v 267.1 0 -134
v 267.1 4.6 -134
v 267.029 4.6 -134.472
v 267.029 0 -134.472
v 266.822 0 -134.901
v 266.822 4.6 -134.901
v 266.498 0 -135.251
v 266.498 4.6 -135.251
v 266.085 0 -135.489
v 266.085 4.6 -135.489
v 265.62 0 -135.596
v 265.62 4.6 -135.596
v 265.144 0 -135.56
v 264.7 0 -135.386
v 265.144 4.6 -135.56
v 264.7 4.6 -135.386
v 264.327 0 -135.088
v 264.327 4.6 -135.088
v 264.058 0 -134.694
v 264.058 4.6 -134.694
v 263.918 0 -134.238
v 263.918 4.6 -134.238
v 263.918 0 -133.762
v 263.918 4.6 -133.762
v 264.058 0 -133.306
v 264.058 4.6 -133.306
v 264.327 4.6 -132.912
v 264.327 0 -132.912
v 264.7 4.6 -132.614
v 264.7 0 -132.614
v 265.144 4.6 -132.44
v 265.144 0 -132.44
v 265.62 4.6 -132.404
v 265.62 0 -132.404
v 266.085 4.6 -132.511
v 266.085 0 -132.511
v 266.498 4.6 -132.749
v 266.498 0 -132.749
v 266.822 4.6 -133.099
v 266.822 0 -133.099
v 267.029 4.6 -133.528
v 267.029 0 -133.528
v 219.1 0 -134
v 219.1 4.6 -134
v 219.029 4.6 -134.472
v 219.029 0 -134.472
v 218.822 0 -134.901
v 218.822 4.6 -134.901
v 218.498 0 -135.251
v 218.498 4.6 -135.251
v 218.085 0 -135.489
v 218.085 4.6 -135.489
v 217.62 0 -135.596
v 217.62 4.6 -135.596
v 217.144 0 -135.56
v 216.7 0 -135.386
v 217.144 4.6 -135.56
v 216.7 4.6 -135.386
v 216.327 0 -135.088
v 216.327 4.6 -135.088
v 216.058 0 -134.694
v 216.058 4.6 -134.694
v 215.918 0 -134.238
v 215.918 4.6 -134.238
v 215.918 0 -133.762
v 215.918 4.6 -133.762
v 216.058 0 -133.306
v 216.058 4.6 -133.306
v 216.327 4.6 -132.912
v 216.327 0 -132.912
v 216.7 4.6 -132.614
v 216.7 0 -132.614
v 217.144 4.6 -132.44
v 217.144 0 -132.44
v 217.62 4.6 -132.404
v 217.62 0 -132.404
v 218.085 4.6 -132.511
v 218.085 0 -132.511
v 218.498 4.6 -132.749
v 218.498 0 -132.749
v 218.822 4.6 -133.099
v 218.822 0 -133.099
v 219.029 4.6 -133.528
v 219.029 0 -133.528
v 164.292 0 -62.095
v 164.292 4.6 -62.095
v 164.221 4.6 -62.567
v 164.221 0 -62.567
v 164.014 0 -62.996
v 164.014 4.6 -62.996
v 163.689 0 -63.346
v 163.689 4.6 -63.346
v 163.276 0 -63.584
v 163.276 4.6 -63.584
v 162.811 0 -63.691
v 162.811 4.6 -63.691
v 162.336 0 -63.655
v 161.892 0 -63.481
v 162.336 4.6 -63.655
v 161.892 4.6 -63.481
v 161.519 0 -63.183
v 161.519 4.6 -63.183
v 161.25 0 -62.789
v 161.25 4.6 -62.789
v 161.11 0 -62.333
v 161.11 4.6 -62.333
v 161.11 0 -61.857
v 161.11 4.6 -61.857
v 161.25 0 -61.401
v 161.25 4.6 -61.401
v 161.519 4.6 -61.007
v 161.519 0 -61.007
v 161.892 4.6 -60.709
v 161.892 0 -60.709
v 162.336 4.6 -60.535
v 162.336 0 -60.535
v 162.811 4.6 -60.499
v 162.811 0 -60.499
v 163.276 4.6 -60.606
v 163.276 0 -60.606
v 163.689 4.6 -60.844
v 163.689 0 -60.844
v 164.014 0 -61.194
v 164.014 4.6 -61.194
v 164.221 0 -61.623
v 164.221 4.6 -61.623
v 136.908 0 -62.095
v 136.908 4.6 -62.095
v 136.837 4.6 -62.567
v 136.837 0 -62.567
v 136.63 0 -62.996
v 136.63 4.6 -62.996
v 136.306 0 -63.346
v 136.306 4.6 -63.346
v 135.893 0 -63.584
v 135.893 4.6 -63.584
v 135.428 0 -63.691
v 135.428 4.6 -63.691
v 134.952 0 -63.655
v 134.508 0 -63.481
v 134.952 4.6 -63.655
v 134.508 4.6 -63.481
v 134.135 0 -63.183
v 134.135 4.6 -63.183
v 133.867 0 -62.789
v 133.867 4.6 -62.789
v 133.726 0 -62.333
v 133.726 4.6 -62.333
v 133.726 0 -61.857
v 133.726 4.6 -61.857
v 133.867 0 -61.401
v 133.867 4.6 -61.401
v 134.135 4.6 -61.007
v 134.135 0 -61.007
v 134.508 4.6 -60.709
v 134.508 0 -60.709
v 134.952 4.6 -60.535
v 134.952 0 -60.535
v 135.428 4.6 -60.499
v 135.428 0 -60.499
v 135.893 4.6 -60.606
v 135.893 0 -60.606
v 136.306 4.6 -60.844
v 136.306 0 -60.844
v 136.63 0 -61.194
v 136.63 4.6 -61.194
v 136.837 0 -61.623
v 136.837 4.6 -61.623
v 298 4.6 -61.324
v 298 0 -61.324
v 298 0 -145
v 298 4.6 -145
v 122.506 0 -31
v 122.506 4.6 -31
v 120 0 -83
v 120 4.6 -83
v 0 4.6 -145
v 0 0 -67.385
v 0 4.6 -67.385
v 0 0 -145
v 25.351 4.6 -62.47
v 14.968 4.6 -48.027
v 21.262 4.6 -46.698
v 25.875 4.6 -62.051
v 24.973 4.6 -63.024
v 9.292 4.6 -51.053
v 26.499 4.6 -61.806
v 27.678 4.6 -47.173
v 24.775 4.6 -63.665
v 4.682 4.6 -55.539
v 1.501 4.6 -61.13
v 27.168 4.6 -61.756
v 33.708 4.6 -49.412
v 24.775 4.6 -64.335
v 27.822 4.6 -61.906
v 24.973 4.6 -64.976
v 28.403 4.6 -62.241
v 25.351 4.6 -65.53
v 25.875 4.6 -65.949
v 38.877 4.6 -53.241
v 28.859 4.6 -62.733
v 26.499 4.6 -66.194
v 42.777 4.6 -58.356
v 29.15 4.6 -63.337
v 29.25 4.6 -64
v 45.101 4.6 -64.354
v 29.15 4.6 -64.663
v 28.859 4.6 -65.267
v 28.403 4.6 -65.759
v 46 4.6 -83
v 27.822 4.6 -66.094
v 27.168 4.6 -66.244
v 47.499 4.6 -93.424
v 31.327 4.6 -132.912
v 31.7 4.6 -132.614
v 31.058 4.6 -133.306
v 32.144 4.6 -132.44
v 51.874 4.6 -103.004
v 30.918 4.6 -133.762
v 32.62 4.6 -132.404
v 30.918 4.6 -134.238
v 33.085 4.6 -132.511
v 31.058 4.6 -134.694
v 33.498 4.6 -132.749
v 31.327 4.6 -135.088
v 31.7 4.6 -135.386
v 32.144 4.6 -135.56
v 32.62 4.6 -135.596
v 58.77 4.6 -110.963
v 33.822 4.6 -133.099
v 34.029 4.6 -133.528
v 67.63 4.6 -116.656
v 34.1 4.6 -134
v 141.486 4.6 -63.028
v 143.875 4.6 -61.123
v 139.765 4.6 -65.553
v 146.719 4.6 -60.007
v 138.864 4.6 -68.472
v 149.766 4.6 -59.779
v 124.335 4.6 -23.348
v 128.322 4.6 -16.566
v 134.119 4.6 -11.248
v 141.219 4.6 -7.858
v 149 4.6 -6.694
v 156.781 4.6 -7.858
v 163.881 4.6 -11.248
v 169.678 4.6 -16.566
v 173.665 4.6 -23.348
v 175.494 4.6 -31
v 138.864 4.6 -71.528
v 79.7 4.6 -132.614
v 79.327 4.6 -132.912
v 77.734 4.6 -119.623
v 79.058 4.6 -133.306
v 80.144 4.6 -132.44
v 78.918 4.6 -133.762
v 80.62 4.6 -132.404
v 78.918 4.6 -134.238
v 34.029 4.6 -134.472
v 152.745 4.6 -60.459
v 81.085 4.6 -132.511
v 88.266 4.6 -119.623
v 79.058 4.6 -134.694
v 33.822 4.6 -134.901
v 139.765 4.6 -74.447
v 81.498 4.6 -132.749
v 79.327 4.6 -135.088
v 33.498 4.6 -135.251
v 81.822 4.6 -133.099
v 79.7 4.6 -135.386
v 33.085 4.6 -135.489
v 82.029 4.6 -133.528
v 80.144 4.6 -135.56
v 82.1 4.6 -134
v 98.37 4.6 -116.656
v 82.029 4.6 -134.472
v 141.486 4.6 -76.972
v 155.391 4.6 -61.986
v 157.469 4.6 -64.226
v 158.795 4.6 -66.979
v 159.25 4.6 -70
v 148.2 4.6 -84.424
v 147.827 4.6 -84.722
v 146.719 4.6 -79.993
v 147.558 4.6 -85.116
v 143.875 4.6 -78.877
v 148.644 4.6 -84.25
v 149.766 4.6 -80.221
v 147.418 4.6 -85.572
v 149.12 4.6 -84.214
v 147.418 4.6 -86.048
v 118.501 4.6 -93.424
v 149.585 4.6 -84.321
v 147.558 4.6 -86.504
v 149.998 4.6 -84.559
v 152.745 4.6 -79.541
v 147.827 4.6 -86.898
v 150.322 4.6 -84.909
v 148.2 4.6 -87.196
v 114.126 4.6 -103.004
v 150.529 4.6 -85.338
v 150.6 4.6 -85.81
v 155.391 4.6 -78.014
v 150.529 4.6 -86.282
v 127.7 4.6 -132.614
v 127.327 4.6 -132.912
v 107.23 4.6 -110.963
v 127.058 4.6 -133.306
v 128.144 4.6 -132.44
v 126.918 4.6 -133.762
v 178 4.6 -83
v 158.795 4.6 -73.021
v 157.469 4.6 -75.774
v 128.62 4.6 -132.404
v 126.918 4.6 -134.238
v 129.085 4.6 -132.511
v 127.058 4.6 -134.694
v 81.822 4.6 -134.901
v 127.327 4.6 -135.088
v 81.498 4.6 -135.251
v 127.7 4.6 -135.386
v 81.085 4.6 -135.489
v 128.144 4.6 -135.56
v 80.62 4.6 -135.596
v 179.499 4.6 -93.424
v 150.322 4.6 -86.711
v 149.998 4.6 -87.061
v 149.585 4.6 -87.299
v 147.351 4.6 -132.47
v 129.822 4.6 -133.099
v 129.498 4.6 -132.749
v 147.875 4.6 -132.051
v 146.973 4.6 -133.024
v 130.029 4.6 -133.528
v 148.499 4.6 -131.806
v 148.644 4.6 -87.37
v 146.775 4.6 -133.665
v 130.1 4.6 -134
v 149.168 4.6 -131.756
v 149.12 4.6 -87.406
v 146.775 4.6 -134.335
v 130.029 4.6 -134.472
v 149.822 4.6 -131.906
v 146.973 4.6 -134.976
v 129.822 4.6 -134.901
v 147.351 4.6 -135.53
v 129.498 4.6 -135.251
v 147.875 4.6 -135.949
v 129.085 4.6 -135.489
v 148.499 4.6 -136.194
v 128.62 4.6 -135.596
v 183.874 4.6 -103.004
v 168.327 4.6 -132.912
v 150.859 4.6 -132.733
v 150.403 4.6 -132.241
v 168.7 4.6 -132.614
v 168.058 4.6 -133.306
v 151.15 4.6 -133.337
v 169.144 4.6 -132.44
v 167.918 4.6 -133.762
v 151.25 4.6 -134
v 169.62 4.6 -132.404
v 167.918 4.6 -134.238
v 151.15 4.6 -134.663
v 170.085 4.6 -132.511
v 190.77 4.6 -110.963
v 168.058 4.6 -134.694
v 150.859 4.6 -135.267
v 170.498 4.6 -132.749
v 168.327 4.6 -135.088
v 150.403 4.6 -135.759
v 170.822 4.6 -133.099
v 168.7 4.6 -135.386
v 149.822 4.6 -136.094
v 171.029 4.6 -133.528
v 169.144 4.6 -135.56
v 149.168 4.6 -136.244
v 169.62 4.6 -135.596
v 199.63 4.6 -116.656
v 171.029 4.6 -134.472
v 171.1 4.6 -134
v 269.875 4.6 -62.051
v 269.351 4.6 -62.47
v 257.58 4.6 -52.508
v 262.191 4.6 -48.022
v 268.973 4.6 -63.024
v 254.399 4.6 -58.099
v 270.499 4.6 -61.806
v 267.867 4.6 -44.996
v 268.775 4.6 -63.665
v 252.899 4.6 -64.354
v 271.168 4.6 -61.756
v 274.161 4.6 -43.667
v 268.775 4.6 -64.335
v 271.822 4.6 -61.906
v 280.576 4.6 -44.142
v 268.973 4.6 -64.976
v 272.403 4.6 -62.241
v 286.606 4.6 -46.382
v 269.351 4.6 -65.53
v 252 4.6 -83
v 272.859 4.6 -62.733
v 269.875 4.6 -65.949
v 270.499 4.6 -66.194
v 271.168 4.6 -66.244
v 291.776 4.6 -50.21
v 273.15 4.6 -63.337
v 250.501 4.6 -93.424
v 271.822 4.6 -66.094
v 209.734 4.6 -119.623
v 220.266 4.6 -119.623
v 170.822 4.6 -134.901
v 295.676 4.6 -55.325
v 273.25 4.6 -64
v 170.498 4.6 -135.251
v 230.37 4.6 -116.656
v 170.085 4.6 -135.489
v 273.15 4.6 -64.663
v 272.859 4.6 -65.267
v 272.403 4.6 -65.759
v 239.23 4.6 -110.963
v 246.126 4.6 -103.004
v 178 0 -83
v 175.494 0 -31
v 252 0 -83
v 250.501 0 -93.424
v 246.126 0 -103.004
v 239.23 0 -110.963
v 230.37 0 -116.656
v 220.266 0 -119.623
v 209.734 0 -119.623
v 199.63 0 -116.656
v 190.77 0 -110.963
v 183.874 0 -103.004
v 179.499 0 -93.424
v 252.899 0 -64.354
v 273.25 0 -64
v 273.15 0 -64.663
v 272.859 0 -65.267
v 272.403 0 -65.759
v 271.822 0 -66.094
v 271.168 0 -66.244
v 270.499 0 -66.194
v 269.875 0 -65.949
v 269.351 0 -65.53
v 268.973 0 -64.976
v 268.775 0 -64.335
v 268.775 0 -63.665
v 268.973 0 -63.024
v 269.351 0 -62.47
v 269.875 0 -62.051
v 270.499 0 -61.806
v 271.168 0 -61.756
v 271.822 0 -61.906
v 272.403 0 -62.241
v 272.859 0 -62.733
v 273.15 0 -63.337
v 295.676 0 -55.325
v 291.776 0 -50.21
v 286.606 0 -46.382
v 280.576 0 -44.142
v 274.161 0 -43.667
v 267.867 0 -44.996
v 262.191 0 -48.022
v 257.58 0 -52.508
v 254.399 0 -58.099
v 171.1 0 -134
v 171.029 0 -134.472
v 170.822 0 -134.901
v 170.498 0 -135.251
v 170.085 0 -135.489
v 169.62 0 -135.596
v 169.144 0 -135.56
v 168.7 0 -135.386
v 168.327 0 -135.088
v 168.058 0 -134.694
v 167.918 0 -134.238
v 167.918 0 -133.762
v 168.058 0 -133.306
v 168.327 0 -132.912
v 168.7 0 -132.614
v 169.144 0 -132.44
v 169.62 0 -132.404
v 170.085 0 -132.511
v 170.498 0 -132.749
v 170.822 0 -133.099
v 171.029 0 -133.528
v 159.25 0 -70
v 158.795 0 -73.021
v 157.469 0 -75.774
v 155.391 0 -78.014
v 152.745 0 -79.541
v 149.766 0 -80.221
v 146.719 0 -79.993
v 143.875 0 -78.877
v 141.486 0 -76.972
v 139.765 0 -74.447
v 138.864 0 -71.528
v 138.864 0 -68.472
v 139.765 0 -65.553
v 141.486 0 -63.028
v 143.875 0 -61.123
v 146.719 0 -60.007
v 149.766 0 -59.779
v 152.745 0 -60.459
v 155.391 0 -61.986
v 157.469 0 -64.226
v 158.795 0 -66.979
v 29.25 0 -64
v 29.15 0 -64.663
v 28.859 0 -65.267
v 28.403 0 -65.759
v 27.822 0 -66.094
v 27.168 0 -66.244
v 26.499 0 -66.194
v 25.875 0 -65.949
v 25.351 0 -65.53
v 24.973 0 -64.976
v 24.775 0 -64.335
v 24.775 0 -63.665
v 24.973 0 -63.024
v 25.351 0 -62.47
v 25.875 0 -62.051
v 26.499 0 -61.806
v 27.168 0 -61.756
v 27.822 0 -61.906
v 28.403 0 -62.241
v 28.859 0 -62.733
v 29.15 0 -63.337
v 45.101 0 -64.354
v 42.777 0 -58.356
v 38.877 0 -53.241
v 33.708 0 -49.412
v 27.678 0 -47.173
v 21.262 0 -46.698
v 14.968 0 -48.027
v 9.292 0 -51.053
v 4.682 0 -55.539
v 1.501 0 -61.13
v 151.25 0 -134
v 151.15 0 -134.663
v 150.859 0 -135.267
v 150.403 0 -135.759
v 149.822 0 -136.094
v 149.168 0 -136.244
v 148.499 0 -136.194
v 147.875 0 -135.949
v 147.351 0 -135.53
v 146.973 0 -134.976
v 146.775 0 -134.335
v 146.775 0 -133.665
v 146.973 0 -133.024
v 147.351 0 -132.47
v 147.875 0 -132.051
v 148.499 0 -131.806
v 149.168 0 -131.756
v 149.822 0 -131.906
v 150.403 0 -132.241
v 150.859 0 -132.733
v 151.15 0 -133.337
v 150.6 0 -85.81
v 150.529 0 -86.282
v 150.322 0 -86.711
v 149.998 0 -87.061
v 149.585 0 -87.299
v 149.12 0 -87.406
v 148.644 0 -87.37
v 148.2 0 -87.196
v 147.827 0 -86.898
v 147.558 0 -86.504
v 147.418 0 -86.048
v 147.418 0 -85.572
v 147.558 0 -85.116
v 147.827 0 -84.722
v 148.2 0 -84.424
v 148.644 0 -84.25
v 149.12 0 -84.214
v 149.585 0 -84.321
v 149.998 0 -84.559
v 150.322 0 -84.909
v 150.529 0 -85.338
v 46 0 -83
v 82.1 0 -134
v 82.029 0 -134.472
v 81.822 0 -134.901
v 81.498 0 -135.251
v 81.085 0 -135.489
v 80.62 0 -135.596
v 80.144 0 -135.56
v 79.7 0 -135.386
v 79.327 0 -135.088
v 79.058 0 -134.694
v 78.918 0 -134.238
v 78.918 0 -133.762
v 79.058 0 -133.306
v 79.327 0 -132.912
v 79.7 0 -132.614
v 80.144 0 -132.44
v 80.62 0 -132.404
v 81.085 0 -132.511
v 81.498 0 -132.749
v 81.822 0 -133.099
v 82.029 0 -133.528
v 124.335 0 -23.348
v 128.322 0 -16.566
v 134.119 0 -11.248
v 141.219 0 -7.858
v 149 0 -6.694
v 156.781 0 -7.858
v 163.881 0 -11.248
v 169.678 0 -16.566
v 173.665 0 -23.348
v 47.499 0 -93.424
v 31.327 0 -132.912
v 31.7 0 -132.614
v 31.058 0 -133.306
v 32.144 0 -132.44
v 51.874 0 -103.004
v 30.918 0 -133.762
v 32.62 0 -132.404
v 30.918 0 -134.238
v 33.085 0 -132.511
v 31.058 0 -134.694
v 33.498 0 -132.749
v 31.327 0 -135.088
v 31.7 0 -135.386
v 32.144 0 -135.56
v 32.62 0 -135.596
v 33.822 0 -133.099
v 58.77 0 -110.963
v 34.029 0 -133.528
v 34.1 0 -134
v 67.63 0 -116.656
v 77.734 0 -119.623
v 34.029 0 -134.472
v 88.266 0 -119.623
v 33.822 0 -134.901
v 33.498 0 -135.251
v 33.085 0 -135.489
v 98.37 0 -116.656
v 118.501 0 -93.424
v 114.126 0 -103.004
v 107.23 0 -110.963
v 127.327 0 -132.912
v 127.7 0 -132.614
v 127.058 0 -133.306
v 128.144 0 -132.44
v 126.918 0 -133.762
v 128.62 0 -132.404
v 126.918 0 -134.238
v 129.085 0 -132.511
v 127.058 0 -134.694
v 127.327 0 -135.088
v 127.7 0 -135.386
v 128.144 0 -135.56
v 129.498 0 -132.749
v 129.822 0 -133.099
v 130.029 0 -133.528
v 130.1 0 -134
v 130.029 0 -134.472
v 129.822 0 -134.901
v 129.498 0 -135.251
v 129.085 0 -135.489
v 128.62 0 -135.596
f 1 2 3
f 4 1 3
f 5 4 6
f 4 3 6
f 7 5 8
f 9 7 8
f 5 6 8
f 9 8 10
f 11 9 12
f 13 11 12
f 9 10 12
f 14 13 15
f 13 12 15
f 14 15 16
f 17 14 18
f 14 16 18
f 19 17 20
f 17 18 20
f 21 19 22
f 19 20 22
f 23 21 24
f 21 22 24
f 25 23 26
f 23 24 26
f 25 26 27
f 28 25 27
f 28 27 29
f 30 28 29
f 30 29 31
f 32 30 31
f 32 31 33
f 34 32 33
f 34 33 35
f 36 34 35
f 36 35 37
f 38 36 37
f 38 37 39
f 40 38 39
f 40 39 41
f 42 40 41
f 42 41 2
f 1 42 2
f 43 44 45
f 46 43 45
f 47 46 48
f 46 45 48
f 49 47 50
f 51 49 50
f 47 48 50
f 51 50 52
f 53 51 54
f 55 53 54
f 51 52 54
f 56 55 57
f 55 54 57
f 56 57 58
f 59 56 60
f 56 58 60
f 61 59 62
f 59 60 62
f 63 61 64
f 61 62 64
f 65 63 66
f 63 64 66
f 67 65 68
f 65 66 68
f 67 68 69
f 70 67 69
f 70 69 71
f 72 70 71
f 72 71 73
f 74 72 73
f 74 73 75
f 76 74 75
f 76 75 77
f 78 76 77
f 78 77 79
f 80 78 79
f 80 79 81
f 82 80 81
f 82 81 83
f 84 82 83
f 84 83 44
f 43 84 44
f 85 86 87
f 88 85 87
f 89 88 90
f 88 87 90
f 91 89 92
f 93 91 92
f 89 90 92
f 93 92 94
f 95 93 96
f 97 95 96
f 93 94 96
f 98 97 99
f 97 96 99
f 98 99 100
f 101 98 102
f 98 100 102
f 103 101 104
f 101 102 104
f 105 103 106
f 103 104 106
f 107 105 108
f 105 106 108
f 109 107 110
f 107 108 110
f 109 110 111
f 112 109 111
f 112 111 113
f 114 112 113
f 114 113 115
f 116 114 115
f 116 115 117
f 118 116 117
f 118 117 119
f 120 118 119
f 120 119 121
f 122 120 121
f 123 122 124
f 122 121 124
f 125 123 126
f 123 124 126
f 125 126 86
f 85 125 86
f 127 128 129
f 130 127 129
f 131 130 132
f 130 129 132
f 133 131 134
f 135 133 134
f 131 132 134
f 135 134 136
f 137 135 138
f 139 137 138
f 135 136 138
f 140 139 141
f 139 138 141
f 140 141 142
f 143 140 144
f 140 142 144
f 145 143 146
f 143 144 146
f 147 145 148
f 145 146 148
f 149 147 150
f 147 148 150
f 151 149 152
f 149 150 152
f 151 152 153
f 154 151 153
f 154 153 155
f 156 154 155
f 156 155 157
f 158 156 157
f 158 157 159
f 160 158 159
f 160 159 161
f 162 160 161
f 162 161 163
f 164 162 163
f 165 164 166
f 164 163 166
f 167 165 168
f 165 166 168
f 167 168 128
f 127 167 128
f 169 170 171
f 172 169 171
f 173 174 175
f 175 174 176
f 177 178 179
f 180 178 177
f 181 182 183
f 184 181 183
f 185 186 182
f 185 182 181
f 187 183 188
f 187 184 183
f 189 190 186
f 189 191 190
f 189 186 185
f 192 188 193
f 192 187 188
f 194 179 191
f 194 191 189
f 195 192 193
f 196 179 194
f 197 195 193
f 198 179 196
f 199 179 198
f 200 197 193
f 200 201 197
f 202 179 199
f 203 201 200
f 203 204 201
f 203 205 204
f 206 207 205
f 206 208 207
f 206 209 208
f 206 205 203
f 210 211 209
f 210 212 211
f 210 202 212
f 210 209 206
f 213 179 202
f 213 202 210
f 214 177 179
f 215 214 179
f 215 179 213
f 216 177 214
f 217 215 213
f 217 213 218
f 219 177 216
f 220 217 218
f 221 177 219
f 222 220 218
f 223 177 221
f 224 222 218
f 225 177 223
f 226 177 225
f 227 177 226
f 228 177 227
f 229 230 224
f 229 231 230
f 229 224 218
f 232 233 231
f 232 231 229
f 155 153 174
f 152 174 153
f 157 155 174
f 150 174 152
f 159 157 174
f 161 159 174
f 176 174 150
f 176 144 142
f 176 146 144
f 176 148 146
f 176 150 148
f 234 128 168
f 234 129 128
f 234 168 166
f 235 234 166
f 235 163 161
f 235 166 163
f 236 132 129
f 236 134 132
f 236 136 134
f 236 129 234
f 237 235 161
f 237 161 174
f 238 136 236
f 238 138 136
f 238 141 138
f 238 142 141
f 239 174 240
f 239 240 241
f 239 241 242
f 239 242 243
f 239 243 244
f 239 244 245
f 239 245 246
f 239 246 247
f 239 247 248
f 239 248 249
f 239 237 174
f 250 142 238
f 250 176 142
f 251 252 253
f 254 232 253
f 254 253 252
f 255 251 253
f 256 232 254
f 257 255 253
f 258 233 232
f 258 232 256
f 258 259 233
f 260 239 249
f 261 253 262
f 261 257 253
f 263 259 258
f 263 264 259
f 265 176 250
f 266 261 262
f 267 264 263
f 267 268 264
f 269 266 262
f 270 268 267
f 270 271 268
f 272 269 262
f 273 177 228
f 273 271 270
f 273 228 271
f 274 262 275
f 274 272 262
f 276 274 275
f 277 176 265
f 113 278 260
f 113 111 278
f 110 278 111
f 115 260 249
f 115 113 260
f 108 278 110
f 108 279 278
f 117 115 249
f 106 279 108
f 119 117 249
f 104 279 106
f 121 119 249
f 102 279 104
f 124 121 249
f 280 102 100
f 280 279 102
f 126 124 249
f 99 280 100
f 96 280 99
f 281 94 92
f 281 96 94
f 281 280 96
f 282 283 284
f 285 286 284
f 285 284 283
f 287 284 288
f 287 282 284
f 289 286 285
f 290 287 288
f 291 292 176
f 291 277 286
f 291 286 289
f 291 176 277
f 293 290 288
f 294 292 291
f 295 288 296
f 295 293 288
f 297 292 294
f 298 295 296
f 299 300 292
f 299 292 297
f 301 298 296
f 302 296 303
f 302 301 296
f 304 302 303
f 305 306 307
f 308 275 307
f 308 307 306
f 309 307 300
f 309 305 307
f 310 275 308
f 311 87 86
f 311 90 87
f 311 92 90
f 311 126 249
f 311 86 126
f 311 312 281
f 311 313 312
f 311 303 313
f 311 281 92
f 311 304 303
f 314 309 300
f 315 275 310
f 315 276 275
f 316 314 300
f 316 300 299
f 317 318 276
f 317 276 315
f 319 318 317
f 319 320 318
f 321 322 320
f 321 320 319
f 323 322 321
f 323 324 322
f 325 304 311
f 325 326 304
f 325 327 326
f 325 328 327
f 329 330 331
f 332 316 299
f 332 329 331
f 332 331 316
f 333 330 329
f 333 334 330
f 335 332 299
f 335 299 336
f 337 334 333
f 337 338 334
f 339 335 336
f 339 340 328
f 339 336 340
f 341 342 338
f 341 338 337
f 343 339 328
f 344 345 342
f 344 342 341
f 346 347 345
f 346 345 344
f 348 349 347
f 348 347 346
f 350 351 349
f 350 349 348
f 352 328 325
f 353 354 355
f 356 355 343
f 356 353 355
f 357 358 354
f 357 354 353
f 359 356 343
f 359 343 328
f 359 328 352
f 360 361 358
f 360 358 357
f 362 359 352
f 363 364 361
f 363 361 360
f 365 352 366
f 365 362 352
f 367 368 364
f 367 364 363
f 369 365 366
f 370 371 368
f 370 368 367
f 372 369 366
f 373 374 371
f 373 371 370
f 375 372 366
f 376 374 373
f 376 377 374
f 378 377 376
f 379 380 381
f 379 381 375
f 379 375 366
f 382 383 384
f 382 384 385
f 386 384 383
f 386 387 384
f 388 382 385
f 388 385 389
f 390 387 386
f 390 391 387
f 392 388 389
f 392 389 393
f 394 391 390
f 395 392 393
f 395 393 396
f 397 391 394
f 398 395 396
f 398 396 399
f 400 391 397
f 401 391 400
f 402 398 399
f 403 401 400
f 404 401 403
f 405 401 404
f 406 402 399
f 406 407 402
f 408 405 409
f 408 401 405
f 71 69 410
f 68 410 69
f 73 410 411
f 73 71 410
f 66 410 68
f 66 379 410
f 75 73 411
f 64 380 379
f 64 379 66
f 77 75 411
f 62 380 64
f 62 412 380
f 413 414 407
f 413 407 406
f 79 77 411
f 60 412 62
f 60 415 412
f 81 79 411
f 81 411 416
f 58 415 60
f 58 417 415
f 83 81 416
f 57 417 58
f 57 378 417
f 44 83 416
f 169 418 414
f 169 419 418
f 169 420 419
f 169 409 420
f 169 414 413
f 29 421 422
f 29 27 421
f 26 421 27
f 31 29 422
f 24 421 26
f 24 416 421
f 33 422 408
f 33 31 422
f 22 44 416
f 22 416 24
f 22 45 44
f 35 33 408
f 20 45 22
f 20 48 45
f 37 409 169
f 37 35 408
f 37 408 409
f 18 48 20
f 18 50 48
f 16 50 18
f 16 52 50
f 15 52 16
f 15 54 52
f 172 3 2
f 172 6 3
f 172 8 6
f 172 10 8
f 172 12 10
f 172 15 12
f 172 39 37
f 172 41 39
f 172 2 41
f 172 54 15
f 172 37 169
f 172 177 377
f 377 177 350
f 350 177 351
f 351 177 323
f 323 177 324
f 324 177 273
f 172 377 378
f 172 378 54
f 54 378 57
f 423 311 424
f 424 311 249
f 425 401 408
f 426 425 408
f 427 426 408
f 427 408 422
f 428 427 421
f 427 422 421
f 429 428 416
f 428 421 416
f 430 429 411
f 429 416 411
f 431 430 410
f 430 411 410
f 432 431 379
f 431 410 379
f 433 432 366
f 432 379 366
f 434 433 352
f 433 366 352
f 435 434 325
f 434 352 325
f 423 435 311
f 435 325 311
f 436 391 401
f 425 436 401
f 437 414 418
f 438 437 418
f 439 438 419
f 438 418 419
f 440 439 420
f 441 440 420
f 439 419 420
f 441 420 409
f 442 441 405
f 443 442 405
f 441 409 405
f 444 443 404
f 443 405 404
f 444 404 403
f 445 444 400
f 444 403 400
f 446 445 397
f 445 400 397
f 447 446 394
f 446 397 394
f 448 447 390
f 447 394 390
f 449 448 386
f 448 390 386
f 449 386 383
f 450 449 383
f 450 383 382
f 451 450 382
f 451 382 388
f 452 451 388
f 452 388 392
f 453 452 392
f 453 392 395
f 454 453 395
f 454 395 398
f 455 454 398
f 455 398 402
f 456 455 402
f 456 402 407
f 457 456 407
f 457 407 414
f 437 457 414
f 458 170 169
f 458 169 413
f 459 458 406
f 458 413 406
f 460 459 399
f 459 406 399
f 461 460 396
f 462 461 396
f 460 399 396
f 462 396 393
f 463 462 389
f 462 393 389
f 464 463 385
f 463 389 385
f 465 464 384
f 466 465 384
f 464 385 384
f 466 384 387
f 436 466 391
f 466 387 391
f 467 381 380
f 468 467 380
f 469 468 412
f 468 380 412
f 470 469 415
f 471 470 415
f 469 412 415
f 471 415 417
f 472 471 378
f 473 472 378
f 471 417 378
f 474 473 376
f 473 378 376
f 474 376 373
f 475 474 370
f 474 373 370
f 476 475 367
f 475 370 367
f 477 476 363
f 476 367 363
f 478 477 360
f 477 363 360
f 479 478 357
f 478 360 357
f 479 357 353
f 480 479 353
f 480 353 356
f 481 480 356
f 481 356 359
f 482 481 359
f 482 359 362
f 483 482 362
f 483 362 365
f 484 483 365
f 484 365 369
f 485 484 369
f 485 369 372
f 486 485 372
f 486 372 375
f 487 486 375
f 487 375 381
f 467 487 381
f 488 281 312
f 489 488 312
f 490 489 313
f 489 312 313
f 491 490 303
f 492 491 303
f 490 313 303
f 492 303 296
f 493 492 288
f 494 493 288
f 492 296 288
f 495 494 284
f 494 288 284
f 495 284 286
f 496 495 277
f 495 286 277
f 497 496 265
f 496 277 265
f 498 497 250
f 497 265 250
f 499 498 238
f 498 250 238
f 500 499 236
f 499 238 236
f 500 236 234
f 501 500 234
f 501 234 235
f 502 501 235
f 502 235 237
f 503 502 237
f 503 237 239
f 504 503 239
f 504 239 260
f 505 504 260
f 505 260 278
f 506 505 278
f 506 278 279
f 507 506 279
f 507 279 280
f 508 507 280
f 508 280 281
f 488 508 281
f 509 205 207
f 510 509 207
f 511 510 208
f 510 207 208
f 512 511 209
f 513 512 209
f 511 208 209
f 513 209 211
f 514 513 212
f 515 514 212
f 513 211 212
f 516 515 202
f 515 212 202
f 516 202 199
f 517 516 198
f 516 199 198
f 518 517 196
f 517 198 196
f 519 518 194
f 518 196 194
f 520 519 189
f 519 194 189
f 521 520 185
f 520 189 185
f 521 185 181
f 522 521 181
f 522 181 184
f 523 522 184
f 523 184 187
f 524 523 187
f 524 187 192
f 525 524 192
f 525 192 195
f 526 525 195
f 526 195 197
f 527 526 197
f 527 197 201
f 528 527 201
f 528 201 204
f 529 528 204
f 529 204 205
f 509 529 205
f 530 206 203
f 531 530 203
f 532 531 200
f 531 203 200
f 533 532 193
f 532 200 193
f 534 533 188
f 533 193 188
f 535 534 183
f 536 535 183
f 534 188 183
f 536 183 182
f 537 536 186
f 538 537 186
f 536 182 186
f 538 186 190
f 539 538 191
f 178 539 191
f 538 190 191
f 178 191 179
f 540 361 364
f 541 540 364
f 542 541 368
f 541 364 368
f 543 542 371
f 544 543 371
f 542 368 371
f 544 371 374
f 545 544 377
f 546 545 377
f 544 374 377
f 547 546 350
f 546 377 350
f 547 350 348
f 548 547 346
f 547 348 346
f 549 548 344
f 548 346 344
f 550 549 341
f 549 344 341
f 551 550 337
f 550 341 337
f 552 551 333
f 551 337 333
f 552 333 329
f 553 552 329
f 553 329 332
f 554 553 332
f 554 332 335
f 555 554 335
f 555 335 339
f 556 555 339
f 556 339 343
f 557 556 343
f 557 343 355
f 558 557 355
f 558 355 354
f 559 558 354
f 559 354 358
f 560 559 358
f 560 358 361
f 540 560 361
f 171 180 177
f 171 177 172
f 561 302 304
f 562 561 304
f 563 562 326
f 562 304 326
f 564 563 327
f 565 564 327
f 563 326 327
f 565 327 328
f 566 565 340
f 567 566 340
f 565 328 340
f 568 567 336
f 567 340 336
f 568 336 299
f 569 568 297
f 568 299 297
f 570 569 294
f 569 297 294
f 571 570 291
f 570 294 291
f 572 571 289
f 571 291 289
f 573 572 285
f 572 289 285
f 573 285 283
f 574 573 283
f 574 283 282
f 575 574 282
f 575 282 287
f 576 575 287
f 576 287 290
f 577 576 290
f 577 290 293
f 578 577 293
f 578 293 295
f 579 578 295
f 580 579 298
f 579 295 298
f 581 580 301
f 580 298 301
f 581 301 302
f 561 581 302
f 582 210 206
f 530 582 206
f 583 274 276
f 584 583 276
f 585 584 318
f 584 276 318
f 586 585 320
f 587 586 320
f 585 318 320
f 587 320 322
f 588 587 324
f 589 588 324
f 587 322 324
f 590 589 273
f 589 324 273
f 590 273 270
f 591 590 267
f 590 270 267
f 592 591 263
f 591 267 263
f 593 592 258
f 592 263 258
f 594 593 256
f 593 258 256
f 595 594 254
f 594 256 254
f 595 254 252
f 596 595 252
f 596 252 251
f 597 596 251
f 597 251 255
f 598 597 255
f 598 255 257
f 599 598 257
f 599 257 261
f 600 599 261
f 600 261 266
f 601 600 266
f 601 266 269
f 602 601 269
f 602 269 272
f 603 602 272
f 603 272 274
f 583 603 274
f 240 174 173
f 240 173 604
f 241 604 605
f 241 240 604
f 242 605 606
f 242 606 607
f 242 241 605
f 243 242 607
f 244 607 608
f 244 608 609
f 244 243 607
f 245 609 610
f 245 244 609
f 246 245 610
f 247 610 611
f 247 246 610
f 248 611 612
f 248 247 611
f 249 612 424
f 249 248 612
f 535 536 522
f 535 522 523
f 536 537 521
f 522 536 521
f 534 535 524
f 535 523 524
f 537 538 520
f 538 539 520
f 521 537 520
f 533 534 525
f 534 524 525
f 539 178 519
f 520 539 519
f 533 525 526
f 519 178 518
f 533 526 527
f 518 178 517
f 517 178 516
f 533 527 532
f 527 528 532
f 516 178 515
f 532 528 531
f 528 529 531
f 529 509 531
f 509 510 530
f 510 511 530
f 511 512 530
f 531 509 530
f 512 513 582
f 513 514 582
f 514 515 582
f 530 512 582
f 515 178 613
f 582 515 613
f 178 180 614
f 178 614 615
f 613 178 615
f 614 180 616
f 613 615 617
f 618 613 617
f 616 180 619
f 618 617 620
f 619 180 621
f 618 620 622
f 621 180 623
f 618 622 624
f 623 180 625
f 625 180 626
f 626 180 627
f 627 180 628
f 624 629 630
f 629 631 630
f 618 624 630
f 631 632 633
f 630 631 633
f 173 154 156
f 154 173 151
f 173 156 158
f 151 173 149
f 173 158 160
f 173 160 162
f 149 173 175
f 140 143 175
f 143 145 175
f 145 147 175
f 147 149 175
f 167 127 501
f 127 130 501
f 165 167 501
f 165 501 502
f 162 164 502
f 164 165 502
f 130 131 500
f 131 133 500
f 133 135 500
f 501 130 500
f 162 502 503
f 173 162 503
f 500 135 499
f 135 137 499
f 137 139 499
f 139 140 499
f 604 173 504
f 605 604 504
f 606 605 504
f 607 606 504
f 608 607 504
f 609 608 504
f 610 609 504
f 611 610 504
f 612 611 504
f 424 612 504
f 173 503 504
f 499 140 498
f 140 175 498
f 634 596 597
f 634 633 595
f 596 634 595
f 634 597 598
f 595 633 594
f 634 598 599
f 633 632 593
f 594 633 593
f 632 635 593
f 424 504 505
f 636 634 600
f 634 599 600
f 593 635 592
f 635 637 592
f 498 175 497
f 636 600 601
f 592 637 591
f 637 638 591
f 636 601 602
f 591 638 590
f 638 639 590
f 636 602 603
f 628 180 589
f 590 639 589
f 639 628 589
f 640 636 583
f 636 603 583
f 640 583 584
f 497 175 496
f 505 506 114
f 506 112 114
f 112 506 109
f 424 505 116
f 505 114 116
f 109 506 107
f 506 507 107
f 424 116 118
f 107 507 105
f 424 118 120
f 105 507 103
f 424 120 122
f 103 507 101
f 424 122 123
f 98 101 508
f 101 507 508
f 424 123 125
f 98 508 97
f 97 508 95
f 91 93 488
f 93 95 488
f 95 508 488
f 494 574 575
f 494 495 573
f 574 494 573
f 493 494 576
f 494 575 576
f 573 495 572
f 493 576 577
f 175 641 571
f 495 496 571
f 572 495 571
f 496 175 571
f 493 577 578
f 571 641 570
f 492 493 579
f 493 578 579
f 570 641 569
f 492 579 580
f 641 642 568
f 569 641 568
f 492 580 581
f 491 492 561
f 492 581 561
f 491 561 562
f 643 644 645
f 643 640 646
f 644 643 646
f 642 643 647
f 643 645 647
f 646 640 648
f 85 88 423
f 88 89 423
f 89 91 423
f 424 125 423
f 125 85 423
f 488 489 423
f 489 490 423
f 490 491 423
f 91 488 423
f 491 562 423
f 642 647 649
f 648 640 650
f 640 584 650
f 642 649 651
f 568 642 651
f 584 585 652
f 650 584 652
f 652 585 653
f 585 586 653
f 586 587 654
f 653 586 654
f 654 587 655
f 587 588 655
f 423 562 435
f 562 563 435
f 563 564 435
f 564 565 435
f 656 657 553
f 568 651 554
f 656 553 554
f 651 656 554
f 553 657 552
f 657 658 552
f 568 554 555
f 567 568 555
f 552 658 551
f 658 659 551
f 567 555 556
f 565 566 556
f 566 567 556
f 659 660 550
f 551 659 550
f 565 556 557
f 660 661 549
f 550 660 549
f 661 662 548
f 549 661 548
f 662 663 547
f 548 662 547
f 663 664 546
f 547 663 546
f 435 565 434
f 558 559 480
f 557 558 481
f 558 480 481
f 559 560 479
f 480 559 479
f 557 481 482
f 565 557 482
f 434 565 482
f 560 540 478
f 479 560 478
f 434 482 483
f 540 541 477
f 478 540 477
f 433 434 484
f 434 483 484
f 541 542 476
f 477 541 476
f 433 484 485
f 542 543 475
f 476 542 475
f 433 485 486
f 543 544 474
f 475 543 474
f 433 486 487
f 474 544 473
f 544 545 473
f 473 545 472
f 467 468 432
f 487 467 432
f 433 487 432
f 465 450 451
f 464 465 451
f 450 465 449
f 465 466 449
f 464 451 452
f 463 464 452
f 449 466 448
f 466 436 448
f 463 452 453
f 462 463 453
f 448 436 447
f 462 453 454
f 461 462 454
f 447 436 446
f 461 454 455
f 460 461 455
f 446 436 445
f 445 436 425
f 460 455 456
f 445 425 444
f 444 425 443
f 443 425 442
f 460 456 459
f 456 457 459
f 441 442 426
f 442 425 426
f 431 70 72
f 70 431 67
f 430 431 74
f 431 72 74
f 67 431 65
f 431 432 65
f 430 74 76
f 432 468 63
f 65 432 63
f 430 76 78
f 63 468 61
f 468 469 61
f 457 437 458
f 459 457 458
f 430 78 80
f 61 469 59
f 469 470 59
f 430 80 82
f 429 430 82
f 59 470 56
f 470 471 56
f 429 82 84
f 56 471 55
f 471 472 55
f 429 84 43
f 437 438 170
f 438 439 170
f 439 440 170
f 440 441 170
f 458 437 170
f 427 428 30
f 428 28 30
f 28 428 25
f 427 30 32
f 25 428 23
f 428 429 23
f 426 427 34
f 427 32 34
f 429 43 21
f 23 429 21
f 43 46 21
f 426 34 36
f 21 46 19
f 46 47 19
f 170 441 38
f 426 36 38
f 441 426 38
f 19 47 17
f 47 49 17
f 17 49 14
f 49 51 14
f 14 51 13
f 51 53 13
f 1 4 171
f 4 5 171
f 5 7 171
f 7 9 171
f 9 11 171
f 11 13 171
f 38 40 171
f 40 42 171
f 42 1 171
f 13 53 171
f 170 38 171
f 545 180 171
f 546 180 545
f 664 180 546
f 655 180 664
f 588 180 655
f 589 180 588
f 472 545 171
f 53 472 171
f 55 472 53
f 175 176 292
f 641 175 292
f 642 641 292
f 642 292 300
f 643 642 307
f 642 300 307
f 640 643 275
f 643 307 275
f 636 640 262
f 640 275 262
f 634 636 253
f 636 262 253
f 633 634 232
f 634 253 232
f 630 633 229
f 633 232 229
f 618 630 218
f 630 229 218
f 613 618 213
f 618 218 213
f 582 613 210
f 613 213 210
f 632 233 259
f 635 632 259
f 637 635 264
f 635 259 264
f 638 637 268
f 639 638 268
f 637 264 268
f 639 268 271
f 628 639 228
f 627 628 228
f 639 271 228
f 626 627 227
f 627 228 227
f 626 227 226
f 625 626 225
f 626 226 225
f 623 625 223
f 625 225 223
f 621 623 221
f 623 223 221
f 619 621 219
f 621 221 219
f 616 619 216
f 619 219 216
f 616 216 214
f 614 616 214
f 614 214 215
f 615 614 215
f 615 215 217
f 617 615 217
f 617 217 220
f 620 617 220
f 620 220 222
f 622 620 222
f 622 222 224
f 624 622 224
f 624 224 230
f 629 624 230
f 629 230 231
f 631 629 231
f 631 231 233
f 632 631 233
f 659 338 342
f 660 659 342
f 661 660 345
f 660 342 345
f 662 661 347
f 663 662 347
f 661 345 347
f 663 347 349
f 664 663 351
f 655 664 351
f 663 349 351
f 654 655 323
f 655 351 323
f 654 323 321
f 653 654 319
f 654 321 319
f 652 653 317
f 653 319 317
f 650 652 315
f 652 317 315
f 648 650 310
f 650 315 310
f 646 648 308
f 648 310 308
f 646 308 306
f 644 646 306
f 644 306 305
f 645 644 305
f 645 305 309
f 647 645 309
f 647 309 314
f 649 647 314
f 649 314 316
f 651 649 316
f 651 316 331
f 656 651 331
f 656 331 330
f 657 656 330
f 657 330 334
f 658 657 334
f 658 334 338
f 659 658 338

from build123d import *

# Parameters (mm, degrees)
ESQUISSE2_W                = 298
ESQUISSE2_H                = 145
BOSS_EXTRU_1_DEPTH         = 4.6
CREUX_STOCKAGE_VERRE_DEPTH = 46.6
ESQUISSE6_R                = 10.25
TROU_BILLE_DEPTH           = 5.6
ESQUISSE7_R                = 1.6
ENL_V_MAT_EXTRU_3_DEPTH    = 5.6
ENL_V_MAT_EXTRU_7_DEPTH    = 29
ESQUISSE17_R               = 1.6
ENL_V_MAT_EXTRU_14_DEPTH   = 4.6
BOSS_EXTRU_5_DEPTH         = 4.6
ENL_V_MAT_EXTRU_15_DEPTH   = 4.6
ENL_V_MAT_EXTRU_16_DEPTH   = 4.6
ESQUISSE12_R               = 2.25
ENL_V_MAT_EXTRU_17_DEPTH   = 10


with BuildPart() as part:
    # Esquisse2 → Boss.-Extru.1 (new body)
    with BuildSketch(Plane(origin=(0, 0, 0), x_dir=(1, 0, 0), z_dir=(0, 1, 0))):
        with Locations((149, 72.5)):
            Rectangle(ESQUISSE2_W, ESQUISSE2_H)
    extrude(amount=BOSS_EXTRU_1_DEPTH)

    # Esquisse3 → creux_stockage_verre (cut)
    with BuildSketch(Plane(origin=(0, 4.6, 0), x_dir=(1, 0, 0), z_dir=(0, 1, 0))):
        with BuildLine():
            Line((46, 83), (42, 0))
            Line((42, 0), (124, 0))
            Line((124, 0), (120, 83))
            ThreePointArc((120, 83), (83, 120), (46, 83))
        make_face()
        with BuildLine():
            Line((174, 0), (256, 0))
            Line((256, 0), (252, 83))
            ThreePointArc((252, 83), (215, 120), (178, 83))
            Line((178, 83), (174, 0))
        make_face()
    extrude(amount=-CREUX_STOCKAGE_VERRE_DEPTH, mode=Mode.SUBTRACT)

    # Esquisse6 → trou_bille (cut, through all)
    with BuildSketch(Plane(origin=(0, 4.6, 0), x_dir=(1, 0, 0), z_dir=(0, 1, 0))):
        with Locations((149, 70)):
            Circle(ESQUISSE6_R)
    extrude(amount=-TROU_BILLE_DEPTH, mode=Mode.SUBTRACT)

    # Esquisse7 → Enlèv. mat.-Extru.3 (cut, through all)
    with BuildSketch(Plane(origin=(0, 4.6, 0), x_dir=(1, 0, 0), z_dir=(0, 1, 0))):
        with Locations((32.5, 134)):
            Circle(ESQUISSE7_R)
        with Locations((80.5, 134)):
            Circle(ESQUISSE7_R)
        with Locations((128.5, 134)):
            Circle(ESQUISSE7_R)
        with Locations((217.5, 134)):
            Circle(ESQUISSE7_R)
        with Locations((169.5, 134)):
            Circle(ESQUISSE7_R)
        with Locations((265.5, 134)):
            Circle(ESQUISSE7_R)
    extrude(amount=-ENL_V_MAT_EXTRU_3_DEPTH, mode=Mode.SUBTRACT)

    # Esquisse9 → Enlèv. mat.-Extru.7 (cut)
    with BuildSketch(Plane(origin=(0, 4.6, 0), x_dir=(1, 0, 0), z_dir=(0, 1, 0))):
        with BuildLine():
            Line((123.101131567, 18.651519988), (120.058616356, -9.942070174))
            Line((120.058616356, -9.942070174), (178.789756957, -9.942070174))
            Line((178.789756957, -9.942070174), (174.898868433, 18.651519988))
            ThreePointArc((174.898868433, 18.651519988), (149, 12.489846239), (123.101131567, 18.651519988))
        make_face()
    extrude(amount=-ENL_V_MAT_EXTRU_7_DEPTH, mode=Mode.SUBTRACT)

    # Esquisse17 → Enlèv. mat.-Extru.14 (cut)
    with BuildSketch(Plane(origin=(0, 4.6, 0), x_dir=(1, 0, 0), z_dir=(0, 1, 0))):
        with Locations((149, 85.81)):
            Circle(ESQUISSE17_R)
        with Locations((135.308138366, 62.095)):
            Circle(ESQUISSE17_R)
        with Locations((162.691861634, 62.095)):
            Circle(ESQUISSE17_R)
    extrude(amount=-ENL_V_MAT_EXTRU_14_DEPTH, mode=Mode.SUBTRACT)

    # Esquisse15 → Boss.-Extru.5 (add)
    with BuildSketch(Plane(origin=(0, 4.6, 0), x_dir=(1, 0, 0), z_dir=(0, 1, 0))):
        with BuildLine():
            ThreePointArc((175.493975904, 31), (149, 6), (122.506024096, 31))
            ThreePointArc((122.506024096, 31), (149, 25.792591017), (175.493975904, 31))
        make_face()
    extrude(amount=-BOSS_EXTRU_5_DEPTH)

    # Esquisse18 → Enlèv. mat.-Extru.15 (cut)
    with BuildSketch(Plane(origin=(0, 4.6, 0), x_dir=(1, 0, 0), z_dir=(0, 1, 0))):
        with BuildLine():
            Line((175.493975904, 31), (178.847567105, -7.009778322))
            Line((178.847567105, -7.009778322), (115.973210985, -7.009778322))
            Line((115.973210985, -7.009778322), (122.506024096, 31))
            ThreePointArc((122.506024096, 31), (149, 6.694262171), (175.493975904, 31))
        make_face()
    extrude(amount=-ENL_V_MAT_EXTRU_15_DEPTH, mode=Mode.SUBTRACT)

    # Esquisse14 → Enlèv. mat.-Extru.16 (cut)
    with BuildSketch(Plane(origin=(0, 4.6, 0), x_dir=(1, 0, 0), z_dir=(0, 1, 0))):
        with BuildLine():
            Line((0, 71.707789669), (-22.158835411, -9.528975932))
            Line((-22.158835411, -9.528975932), (50.380974376, -9.528975932))
            Line((50.380974376, -9.528975932), (45.101419153, 64.354447432))
            ThreePointArc((45.101419153, 64.354447432), (19.112822484, 46.944980874), (0, 71.707789669))
        make_face()
        with BuildLine():
            Line((252.898580847, 64.354447432), (243.707235712, -12.373693019))
            Line((243.707235712, -12.373693019), (332.150206643, -12.373693019))
            Line((332.150206643, -12.373693019), (298, 71.707789669))
            ThreePointArc((298, 71.707789669), (279.381330699, 43.914112857), (252.898580847, 64.354447432))
        make_face()
    extrude(amount=-ENL_V_MAT_EXTRU_16_DEPTH, mode=Mode.SUBTRACT)

    # Esquisse12 → Enlèv. mat.-Extru.17 (cut)
    with BuildSketch(Plane(origin=(0, 4.6, 0), x_dir=(1, 0, 0), z_dir=(0, 1, 0))):
        with Locations((27, 64)):
            Circle(ESQUISSE12_R)
        with Locations((149, 134)):
            Circle(ESQUISSE12_R)
        with Locations((271, 64)):
            Circle(ESQUISSE12_R)
    extrude(amount=-ENL_V_MAT_EXTRU_17_DEPTH, mode=Mode.SUBTRACT)


solid = part.part
